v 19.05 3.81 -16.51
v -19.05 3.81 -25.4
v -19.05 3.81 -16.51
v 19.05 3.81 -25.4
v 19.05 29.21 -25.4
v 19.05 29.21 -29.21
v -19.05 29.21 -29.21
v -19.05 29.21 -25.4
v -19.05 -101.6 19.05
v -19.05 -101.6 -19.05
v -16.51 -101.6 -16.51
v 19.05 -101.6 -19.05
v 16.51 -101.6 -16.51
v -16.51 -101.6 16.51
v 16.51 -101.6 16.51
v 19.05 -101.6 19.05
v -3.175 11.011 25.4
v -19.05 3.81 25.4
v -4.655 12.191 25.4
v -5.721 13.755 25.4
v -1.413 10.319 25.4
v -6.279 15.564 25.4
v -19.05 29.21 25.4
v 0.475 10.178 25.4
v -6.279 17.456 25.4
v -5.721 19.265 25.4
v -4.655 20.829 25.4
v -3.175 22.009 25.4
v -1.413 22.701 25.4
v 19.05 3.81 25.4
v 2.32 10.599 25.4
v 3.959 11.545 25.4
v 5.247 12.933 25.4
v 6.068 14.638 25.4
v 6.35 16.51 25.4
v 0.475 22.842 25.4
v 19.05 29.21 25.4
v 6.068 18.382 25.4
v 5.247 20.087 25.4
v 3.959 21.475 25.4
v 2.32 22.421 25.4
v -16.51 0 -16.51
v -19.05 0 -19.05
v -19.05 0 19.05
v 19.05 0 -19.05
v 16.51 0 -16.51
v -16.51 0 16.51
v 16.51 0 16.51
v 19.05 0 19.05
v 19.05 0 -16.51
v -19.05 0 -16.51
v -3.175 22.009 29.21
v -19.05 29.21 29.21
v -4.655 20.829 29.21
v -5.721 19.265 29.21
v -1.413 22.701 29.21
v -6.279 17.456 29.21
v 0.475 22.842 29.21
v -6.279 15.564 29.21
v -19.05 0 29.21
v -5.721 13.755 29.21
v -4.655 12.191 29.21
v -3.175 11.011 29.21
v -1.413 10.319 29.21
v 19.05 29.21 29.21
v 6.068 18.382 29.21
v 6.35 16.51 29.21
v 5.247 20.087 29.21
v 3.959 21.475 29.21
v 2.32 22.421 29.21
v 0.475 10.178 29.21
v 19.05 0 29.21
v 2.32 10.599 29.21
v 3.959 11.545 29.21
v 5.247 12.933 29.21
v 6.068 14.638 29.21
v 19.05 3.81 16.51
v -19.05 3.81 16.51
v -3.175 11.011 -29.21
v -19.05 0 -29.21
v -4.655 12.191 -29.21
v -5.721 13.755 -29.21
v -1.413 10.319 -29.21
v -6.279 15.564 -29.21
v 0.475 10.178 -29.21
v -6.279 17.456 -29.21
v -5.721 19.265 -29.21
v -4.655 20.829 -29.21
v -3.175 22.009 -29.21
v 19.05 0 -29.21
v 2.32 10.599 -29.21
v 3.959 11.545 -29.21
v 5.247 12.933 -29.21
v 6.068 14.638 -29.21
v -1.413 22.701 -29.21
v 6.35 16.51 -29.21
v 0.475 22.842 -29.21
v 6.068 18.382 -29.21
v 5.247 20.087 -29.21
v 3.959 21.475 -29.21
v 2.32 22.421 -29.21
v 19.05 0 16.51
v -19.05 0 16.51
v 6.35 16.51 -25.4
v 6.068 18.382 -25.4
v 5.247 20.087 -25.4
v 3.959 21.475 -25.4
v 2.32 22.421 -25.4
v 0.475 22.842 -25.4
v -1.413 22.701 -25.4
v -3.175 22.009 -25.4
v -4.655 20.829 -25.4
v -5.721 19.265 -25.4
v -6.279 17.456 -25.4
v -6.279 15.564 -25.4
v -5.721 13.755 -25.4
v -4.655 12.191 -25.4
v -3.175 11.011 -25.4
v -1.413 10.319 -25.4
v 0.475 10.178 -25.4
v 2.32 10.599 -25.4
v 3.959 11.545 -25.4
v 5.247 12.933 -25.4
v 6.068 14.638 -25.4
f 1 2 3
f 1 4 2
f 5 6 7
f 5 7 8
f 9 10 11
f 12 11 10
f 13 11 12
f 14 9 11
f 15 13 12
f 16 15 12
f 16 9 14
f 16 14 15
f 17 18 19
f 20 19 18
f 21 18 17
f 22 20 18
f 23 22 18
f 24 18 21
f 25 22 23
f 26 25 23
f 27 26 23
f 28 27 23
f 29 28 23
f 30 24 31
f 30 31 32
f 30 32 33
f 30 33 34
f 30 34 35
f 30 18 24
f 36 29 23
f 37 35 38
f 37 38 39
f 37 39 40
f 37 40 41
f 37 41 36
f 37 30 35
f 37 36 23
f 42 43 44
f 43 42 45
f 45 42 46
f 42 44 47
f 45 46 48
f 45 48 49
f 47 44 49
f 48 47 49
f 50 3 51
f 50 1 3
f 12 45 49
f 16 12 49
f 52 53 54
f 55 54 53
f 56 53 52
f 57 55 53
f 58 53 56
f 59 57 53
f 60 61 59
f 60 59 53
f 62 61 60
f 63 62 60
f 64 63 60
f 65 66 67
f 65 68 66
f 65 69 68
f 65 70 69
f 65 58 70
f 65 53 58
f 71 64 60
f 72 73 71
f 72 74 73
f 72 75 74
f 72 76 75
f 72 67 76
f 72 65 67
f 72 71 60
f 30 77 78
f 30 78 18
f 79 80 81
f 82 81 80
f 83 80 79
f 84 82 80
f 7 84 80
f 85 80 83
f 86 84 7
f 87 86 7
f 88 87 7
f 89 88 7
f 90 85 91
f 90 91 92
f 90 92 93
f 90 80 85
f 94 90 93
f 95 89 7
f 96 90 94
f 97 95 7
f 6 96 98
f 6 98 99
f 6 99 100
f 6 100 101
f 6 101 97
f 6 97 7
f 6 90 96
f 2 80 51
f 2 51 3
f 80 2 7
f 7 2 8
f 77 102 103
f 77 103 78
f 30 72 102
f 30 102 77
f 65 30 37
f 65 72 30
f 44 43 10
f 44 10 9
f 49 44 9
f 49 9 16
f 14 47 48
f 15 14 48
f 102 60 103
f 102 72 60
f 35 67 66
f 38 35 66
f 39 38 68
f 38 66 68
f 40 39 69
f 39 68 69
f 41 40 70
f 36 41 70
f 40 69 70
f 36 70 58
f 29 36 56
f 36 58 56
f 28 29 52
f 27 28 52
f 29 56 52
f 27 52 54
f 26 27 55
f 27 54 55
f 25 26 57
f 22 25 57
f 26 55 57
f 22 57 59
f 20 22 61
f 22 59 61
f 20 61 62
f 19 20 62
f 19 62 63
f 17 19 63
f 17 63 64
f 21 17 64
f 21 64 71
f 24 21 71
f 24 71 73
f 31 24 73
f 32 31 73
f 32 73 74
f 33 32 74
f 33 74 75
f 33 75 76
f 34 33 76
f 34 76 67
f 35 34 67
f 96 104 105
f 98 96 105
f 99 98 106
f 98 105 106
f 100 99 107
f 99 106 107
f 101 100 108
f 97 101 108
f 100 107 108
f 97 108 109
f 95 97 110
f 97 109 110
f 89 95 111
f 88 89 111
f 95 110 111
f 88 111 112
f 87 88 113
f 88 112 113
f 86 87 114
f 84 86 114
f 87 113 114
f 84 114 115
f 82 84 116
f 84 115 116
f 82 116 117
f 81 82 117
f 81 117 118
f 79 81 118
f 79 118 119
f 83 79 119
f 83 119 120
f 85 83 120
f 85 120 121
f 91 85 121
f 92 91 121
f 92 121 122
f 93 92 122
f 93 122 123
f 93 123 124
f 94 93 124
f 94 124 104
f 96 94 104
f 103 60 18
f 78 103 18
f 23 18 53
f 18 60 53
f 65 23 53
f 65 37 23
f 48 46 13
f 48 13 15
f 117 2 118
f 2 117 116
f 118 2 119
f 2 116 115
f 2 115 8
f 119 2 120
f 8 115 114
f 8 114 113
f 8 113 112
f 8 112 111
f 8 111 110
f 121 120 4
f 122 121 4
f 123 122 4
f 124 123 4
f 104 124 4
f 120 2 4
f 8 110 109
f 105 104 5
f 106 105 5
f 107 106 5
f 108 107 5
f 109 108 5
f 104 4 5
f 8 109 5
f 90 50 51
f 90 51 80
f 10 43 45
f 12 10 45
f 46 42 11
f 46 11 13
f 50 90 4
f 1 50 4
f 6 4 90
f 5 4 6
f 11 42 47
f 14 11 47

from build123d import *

# Parameters (mm, degrees)
F0_W     = 38.1
F0_H     = 38.1
F0_W_2   = 33.02
F0_H_2   = 33.02
F1_DEPTH = 101.6
F2_W     = 25.4
F2_H     = 3.81
F3_DEPTH = 19.05
F4_R     = 6.35
F5_DEPTH = 58.421
F6_R     = 6.35
F7_DEPTH = 58.421


with BuildPart() as f1:
    # F0 (on Front) → F1 (new body)
    with BuildSketch(Plane.XZ):
        Rectangle(F0_W, F0_H)
        Rectangle(F0_W_2, F0_H_2, mode=Mode.SUBTRACT)
    extrude(amount=F1_DEPTH)

    # F6 (on face) → F7 (cut, through all)
    with BuildSketch(Plane(origin=(0, 0, -29.21), x_dir=(1, 0, 0), z_dir=(0, 0, -1))):
        with Locations((0, -16.51)):
            Circle(F6_R)
    extrude(amount=-F7_DEPTH, mode=Mode.SUBTRACT)


with BuildPart() as f3:
    # F2 (on Right) → F3 (new body, symmetric)
    with BuildSketch(Plane.YZ):
        Polygon((0, 29.21), (0, 16.51), (3.81, 16.51), (3.81, 25.4), (3.81, 29.21), align=None)
        with Locations((16.51, 27.305)):
            Rectangle(F2_W, F2_H)
    extrude(amount=F3_DEPTH, both=True)


with BuildPart() as f3b:
    # F2 (on Right) → F3, piece 2 (new body, symmetric)
    with BuildSketch(Plane.YZ):
        Polygon((3.81, -16.51), (0, -16.51), (0, -29.21), (3.81, -29.21), (3.81, -25.4), align=None)
        with Locations((16.51, -27.305)):
            Rectangle(F2_W, F2_H)
    extrude(amount=F3_DEPTH, both=True)


with BuildPart() as f5_tool:
    # F4 (on face) → F5 (new body, through all)
    with BuildSketch(Plane.XY.offset(29.21)):
        with Locations((0, 16.51)):
            Circle(F4_R)
    extrude(amount=-F5_DEPTH)


with BuildPart() as f3_1:
    add(f3.part)

    # F5: cut by f5_tool
    add(f5_tool.part, mode=Mode.SUBTRACT)


with BuildPart() as f3b_1:
    add(f3b.part)

    # F5: cut by f5_tool
    add(f5_tool.part, mode=Mode.SUBTRACT)


solid = Compound([f1.part, f3_1.part, f3b_1.part])
